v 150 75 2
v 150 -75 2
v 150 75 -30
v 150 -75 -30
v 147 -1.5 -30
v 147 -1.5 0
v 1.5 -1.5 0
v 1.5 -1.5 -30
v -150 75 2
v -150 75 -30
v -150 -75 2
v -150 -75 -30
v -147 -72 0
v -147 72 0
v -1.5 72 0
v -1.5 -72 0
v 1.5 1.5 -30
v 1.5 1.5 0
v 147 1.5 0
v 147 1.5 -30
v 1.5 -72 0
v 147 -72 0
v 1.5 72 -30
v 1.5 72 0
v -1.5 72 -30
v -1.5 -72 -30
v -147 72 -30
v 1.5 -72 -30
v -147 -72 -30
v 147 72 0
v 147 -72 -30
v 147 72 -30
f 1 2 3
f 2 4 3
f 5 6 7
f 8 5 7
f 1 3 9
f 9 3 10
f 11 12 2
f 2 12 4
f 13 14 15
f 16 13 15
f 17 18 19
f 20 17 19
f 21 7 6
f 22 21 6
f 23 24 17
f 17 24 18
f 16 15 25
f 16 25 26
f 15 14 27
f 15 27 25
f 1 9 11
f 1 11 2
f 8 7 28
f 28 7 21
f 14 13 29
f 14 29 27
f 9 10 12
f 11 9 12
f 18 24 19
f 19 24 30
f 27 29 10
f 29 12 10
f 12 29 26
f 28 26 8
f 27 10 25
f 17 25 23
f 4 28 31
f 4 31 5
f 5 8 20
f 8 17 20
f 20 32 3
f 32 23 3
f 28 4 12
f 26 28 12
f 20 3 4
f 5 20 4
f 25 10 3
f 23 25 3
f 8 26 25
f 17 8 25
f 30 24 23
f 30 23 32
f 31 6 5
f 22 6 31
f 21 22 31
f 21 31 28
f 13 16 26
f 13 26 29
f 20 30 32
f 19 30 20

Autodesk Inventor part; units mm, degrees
ref_plane "YZ Plane" through (0, 0, 0) normal (1, 0, 0) x (0, 1, 0)
ref_plane "XZ Plane" through (0, 0, 0) normal (0, 1, 0) x (-1, 0, 0)
ref_plane "XY Plane" through (0, 0, 0) normal (0, 0, 1) x (1, 0, 0)
sketch "Esboço1" plane through (0, 0, 0) normal (0, 0, 1) x (1, 0, 0)
  line L0 (-150, -75) -> (150, -75)
  line L1 (150, -75) -> (150, 75)
  line L2 (150, 75) -> (-150, 75)
  line L3 (-150, 75) -> (-150, -75)
  line L4 (-150, -75) -> (150, 75) construction
  line L5 (-147, 72) -> (147, 72)
  line L6 (147, 72) -> (147, -72)
  line L7 (147, -72) -> (-147, -72)
  line L8 (-147, -72) -> (-147, 72)
  line L9 (0, 72) -> (0, 0) construction
  line L10 (147, 0) -> (0, 0) construction
  line L11 (1.5, 72) -> (1.5, 1.5)
  line L12 (1.5, 1.5) -> (147, 1.5)
  line L13 (0, 0) -> (0, -72) construction
  line L14 (147, -1.5) -> (1.5, -1.5)
  line L15 (1.5, -1.5) -> (1.5, -72)
  line L16 (150, -75) -> (144, -72) construction
  line L17 (0, 0) -> (-150, 75) construction
  line L18 (-1.5, 72) -> (-1.5, 0)
  line L19 (-1.5, 0) -> (-1.5, -72)
  dimension "d0" = 150
  dimension "d1" = 300
  dimension "d2" = 3
  dimension "d3" = 1.5
  dimension "d5" = 1.5
  dimension "d6" = 1.5
  dimension "d7" = 1.5
extrude "Extrusão1" add sketch "Esboço1" along normal blind 2 contours L3 L2 L1 L0 | L5 L18 L19 L7 L8 | L5 L11 L12 L6 L14 L15 L7 L19 L18 | L5 L6 L12 L11 | L15 L14 L6 L7
extrude "Extrusão2" add sketch "Esboço1" against normal blind 30 contours L3 L2 L1 L0 | L5 L11 L12 L6 L14 L15 L7 L19 L18
sketch "Esboço2" plane through (150, -75, 2) normal (1, 0, 0) x (0, 0, -1)
  point P0 (2, 75)
properties part number "nsabo"
